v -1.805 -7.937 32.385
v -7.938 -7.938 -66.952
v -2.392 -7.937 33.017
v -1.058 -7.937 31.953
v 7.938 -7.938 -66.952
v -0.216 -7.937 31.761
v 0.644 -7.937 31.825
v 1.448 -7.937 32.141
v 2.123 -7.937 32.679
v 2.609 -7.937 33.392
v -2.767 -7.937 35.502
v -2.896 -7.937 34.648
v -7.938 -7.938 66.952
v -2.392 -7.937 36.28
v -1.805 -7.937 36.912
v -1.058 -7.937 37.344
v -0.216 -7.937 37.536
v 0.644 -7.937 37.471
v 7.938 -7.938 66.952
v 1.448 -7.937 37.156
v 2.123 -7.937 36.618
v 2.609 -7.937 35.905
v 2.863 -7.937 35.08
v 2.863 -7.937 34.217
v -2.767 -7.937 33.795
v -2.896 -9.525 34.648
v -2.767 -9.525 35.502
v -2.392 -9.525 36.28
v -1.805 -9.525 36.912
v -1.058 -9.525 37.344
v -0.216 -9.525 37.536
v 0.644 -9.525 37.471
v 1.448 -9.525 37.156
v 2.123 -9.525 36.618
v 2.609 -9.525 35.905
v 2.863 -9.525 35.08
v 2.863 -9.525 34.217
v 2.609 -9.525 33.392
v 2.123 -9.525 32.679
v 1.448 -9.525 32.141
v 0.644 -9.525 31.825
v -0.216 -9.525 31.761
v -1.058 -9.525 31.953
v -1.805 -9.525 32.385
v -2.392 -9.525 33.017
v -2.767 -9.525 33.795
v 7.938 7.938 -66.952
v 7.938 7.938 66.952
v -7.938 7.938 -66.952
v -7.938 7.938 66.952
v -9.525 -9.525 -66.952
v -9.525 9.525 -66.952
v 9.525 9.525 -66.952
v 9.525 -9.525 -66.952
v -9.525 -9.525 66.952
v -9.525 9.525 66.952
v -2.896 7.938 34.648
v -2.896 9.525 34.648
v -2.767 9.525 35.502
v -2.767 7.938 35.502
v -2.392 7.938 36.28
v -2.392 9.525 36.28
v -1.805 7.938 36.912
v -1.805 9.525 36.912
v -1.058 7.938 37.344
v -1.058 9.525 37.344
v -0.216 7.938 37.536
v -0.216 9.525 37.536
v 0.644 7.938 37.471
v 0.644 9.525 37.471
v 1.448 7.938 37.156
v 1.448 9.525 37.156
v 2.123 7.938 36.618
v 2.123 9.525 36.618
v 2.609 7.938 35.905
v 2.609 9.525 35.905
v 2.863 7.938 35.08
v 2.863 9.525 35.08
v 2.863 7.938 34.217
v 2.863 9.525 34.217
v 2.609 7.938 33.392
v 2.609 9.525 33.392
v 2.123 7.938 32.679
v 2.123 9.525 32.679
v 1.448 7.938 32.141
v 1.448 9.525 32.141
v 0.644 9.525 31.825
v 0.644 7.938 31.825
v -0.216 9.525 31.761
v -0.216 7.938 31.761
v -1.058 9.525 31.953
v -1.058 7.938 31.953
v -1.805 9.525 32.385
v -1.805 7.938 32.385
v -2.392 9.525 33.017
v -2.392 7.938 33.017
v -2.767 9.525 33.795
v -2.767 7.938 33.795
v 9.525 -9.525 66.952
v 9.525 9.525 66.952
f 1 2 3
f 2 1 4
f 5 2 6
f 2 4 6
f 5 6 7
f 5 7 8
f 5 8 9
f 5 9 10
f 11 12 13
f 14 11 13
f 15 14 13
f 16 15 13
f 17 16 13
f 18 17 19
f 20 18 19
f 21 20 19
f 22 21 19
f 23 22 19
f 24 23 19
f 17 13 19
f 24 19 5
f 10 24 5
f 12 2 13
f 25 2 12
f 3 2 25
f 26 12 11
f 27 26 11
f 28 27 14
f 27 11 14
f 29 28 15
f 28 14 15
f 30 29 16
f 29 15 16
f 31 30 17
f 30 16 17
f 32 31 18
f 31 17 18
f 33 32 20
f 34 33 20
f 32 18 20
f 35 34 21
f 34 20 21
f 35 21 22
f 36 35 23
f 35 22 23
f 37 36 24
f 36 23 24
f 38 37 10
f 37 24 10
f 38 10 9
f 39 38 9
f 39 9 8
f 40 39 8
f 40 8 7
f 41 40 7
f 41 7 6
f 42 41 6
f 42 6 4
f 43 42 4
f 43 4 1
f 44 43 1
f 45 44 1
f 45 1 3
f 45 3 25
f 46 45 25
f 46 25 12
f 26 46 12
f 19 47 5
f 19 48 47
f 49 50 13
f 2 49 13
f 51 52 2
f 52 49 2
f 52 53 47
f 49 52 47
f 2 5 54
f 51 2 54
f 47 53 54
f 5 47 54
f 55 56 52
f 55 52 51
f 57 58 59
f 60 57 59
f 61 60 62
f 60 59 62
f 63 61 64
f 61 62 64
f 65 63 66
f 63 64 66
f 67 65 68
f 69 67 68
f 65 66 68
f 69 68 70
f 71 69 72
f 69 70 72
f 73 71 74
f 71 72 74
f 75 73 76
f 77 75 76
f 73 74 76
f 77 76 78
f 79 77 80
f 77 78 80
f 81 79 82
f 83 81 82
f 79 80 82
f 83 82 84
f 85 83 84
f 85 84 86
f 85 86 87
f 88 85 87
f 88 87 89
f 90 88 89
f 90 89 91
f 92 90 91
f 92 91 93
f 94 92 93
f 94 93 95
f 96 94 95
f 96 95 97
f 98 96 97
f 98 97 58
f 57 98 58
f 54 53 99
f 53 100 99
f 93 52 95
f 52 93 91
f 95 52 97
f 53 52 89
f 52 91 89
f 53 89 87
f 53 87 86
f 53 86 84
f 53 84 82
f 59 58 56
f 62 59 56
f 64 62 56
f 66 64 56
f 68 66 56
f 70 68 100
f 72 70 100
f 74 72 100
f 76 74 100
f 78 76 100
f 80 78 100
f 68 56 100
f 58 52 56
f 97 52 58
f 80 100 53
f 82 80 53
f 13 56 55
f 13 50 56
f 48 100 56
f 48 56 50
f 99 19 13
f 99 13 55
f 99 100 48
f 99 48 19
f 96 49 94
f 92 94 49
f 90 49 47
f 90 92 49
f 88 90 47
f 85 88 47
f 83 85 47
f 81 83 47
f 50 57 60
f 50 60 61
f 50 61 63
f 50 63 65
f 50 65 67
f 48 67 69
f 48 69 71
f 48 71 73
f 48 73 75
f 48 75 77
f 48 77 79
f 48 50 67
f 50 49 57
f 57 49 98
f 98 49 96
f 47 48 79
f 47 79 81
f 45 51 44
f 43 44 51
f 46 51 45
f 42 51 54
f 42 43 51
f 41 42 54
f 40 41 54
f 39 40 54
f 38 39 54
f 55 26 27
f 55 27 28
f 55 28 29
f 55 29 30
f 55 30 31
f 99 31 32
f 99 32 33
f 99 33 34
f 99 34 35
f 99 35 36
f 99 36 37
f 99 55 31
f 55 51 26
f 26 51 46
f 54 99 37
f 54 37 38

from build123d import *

# Parameters (mm, degrees)
SKETCH1_W                = 19.05
SKETCH1_H                = 19.05
SKETCH1_W_2              = 15.875
SKETCH1_H_2              = 15.875
BOSS_EXTRUDE1_DEPTH      = 66.951599904
SKETCH2_R                = 2.8956
BASEPLATEMOUNTHOLE_DEPTH = 71.25770317


with BuildPart() as part:
    # Sketch1 → Boss-Extrude1 (new, symmetric)
    with BuildSketch(Plane(origin=(0, 0, 0), x_dir=(0, -1, 0), z_dir=(0, 0, 1))):
        Rectangle(SKETCH1_W, SKETCH1_H)
        Rectangle(SKETCH1_W_2, SKETCH1_H_2, mode=Mode.SUBTRACT)
    extrude(amount=BOSS_EXTRUDE1_DEPTH, both=True)

    # Sketch2 → BasePlateMountHole (cut, through all)
    with BuildSketch(Plane(origin=(0, 9.525, 0), x_dir=(1, 0, 0), z_dir=(0, 1, 0))):
        with Locations(Location((0, -34.648400096, 0), (0, 0, 180))):
            Circle(SKETCH2_R)
    extrude(amount=-BASEPLATEMOUNTHOLE_DEPTH, mode=Mode.SUBTRACT)


solid = part.part
